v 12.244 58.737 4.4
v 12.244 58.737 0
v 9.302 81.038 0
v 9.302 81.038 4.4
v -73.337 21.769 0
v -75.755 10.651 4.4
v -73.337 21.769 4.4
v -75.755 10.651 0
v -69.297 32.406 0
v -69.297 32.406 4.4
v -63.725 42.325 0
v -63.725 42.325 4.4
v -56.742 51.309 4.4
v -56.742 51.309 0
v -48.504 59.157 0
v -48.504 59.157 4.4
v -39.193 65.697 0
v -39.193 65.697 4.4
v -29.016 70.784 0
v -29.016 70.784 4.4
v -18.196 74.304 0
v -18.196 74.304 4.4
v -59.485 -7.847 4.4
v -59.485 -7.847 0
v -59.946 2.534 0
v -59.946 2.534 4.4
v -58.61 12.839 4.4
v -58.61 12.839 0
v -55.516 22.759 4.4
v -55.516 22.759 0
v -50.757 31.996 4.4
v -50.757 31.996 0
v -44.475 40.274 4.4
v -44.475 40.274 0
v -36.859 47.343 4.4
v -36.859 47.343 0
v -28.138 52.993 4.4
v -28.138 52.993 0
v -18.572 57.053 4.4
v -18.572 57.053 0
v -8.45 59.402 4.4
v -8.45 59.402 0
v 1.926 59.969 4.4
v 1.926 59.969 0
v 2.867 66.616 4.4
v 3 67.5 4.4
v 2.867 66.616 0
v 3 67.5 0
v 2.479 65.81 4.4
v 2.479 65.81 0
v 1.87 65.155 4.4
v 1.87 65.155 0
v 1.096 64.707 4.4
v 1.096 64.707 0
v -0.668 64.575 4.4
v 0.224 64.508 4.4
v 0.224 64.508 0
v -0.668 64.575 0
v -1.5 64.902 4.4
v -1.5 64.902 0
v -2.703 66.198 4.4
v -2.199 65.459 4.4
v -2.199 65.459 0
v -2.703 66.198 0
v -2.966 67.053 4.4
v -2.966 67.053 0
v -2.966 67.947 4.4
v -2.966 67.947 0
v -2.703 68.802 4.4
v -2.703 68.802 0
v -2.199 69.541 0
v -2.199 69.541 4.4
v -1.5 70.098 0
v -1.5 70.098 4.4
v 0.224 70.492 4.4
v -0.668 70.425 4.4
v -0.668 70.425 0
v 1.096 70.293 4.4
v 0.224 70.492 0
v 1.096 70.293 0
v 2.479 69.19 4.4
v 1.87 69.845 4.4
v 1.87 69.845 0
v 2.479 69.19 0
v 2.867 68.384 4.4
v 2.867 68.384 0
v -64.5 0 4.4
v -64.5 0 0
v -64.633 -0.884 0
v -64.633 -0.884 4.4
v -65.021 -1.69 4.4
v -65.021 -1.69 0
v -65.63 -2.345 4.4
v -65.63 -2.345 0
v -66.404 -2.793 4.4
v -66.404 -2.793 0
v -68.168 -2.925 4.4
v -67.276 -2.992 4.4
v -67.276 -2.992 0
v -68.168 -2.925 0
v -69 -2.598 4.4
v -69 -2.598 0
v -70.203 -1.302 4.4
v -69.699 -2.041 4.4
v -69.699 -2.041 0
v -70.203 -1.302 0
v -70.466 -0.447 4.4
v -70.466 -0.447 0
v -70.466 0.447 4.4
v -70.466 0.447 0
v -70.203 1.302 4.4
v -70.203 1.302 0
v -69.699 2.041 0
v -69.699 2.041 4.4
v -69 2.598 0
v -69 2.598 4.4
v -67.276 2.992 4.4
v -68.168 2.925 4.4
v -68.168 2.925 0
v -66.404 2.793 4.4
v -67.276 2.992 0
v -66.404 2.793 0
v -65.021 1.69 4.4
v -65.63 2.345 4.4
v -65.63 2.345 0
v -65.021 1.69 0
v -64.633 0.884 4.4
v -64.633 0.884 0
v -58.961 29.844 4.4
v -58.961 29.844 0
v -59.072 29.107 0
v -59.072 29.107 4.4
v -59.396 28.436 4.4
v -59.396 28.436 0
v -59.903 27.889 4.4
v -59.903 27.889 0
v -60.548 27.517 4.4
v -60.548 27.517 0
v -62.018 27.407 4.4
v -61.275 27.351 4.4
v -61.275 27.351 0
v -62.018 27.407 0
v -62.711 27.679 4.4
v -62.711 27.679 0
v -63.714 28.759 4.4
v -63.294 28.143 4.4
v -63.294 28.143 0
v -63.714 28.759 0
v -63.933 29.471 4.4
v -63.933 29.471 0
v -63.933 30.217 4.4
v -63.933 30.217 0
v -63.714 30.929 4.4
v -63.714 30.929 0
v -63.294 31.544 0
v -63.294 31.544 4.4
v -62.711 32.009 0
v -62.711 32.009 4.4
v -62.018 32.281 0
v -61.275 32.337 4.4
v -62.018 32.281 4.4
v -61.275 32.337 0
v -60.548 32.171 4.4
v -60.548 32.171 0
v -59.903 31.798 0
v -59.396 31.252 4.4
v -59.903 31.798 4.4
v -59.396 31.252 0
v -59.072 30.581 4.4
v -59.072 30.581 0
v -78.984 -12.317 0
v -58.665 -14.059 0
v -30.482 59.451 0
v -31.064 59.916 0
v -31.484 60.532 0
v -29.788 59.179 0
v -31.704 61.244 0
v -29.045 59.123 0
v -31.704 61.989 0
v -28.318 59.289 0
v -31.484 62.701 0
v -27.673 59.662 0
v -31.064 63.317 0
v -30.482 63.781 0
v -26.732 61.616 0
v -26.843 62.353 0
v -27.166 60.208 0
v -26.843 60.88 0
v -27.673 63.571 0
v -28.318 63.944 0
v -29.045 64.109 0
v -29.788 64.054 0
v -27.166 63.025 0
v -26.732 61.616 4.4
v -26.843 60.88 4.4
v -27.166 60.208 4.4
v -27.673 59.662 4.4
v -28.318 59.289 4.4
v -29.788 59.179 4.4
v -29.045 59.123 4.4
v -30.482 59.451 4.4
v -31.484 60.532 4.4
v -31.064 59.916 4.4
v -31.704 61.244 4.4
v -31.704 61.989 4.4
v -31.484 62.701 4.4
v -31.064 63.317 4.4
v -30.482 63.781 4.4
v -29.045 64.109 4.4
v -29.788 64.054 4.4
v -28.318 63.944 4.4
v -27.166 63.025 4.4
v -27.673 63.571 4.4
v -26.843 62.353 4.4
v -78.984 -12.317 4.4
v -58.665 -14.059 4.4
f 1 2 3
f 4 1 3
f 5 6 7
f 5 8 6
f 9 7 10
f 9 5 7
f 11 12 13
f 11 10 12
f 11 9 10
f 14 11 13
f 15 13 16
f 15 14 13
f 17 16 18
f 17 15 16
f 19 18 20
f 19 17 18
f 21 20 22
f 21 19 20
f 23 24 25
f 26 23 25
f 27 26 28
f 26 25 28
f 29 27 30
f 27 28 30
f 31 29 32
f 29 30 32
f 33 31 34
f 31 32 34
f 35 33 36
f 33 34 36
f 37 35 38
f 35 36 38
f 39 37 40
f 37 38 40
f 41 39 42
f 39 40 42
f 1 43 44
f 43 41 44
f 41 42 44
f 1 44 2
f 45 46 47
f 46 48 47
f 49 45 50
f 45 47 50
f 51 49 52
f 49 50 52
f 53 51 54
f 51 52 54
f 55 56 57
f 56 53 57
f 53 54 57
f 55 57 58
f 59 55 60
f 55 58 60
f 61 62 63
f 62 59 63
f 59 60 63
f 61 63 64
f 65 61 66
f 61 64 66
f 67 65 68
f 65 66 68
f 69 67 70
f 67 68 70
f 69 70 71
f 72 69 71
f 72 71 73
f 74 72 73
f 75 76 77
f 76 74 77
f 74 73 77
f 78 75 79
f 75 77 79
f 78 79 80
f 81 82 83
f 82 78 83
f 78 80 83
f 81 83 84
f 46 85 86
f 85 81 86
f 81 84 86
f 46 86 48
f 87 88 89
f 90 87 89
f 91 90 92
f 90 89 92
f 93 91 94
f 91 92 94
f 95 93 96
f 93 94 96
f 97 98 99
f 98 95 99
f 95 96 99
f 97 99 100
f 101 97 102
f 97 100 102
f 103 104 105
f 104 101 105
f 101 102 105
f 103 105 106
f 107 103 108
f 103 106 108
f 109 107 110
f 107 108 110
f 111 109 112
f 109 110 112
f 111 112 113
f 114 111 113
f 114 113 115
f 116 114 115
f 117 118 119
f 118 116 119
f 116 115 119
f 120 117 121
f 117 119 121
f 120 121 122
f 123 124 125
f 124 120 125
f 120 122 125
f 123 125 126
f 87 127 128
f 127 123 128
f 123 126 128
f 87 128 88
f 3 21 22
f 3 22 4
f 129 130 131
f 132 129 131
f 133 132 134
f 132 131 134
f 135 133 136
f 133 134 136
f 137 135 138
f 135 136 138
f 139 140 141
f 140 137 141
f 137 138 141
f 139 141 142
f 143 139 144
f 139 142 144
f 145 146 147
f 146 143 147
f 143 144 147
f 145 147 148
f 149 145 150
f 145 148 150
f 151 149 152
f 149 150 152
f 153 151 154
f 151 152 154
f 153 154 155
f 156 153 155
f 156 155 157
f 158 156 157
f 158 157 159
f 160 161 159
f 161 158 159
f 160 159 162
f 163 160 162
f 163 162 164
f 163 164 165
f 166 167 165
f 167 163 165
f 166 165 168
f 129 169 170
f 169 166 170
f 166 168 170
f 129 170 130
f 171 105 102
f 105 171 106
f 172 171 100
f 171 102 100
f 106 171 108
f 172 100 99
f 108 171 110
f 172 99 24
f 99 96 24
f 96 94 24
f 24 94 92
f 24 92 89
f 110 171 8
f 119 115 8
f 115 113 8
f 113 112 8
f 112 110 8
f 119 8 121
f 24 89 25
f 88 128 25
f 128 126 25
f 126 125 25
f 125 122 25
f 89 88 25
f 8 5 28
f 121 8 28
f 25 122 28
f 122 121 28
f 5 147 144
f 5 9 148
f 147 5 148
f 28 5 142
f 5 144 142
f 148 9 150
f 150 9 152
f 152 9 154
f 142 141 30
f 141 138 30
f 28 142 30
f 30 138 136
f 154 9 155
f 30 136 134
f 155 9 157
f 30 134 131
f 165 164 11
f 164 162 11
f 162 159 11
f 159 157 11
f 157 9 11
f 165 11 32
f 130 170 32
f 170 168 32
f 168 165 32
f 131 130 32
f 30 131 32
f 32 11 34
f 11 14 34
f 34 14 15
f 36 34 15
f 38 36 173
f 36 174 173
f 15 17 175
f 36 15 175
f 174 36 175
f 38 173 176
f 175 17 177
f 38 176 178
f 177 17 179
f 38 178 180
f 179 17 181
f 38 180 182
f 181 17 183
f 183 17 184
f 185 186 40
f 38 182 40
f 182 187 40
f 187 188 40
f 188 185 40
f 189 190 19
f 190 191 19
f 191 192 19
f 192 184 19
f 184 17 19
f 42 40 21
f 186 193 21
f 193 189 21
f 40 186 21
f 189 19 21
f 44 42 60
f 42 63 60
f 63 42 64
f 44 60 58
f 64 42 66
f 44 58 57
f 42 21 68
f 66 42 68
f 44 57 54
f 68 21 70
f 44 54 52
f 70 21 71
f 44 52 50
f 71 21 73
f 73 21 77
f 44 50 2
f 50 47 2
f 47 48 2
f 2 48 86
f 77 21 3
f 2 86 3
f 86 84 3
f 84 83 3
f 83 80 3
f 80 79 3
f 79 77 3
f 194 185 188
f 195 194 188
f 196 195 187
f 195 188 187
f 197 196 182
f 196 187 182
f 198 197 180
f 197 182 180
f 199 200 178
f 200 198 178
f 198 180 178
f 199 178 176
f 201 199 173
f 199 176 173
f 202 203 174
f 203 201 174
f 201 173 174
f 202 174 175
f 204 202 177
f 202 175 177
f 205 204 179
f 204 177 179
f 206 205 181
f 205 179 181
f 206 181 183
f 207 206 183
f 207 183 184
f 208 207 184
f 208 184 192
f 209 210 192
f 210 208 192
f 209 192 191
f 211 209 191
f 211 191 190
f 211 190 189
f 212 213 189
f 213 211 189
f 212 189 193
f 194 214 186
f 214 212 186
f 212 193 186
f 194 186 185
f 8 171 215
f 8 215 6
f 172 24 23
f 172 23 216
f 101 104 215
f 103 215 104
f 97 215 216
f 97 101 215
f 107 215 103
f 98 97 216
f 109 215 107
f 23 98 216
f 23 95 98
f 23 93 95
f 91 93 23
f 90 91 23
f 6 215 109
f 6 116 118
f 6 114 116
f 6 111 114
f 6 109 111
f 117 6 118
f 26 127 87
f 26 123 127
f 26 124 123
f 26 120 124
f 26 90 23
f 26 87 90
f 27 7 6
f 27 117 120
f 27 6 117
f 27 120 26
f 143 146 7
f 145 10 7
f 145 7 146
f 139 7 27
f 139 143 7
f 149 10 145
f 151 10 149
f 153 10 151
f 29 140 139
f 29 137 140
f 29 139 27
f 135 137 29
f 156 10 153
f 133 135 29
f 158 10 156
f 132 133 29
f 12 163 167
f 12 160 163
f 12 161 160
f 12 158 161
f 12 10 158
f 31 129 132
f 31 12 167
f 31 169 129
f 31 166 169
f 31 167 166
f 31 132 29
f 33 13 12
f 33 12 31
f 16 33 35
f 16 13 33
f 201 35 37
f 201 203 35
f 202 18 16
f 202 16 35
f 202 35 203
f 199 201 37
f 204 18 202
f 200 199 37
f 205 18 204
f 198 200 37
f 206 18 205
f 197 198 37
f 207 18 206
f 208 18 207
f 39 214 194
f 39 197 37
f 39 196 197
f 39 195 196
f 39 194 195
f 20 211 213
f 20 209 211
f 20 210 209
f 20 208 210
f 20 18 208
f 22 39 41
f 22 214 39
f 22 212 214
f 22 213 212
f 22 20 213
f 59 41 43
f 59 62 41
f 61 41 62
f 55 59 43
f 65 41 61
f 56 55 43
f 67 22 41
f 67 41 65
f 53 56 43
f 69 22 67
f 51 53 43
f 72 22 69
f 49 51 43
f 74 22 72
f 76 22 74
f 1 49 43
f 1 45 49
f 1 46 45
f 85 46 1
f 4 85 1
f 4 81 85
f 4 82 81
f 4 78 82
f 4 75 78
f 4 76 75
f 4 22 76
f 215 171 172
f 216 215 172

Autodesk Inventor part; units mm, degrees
ref_plane "YZ Plane" through (0, 0, 0) normal (1, 0, 0) x (0, 1, 0)
ref_plane "XZ Plane" through (0, 0, 0) normal (0, 1, 0) x (-1, 0, 0)
ref_plane "XY Plane" through (0, 0, 0) normal (0, 0, 1) x (1, 0, 0)
sketch "Sketch1" plane through (0, 0, 0) normal (0, 0, 1) x (1, 0, 0)
  arc A0 (-18.1959, 74.3045) -> (-75.755, 10.6506) centre (0, 0) ccw
  line L0 (-78.9841, -12.3172) -> (-75.755, 10.6506)
  arc A1 (12.2439, 58.7374) -> (-59.4846, -7.8472) centre (0, 0) ccw
  line L1 (-18.1959, 74.3045) -> (9.302, 81.0383)
  line L2 (-59.4846, -7.8472) -> (-58.6652, -14.0586)
  line L3 (-78.9841, -12.3172) -> (-58.6652, -14.0586)
  line L4 (12.2439, 58.7374) -> (9.302, 81.0383)
  circle A2 centre (-67.5, 0) radius 3 projected
  circle A3 centre (0, 67.5) radius 3 projected
  circle A4 centre (52.0914, 68.8152) radius 17.05 construction
  line L5 (-32.9083, 50.1702) -> (-43.208, 63.1294) construction
  line L6 (-50.5977, 32.2471) -> (-61.3205, 45.7388) construction
  circle A5 centre (-61.4614, 29.8439) radius 2.5
  circle A6 centre (-29.2318, 61.6164) radius 2.5
  point P0 (0, 0)
  dimension "d2" = 25
  dimension "d3" = 5
  dimension "d4" = 5
  dimension "d6" = 10
extrude "Extrusion1" add sketch "Sketch1" along normal blind 4.4
properties part number "FrontMotorPlateBridge"
